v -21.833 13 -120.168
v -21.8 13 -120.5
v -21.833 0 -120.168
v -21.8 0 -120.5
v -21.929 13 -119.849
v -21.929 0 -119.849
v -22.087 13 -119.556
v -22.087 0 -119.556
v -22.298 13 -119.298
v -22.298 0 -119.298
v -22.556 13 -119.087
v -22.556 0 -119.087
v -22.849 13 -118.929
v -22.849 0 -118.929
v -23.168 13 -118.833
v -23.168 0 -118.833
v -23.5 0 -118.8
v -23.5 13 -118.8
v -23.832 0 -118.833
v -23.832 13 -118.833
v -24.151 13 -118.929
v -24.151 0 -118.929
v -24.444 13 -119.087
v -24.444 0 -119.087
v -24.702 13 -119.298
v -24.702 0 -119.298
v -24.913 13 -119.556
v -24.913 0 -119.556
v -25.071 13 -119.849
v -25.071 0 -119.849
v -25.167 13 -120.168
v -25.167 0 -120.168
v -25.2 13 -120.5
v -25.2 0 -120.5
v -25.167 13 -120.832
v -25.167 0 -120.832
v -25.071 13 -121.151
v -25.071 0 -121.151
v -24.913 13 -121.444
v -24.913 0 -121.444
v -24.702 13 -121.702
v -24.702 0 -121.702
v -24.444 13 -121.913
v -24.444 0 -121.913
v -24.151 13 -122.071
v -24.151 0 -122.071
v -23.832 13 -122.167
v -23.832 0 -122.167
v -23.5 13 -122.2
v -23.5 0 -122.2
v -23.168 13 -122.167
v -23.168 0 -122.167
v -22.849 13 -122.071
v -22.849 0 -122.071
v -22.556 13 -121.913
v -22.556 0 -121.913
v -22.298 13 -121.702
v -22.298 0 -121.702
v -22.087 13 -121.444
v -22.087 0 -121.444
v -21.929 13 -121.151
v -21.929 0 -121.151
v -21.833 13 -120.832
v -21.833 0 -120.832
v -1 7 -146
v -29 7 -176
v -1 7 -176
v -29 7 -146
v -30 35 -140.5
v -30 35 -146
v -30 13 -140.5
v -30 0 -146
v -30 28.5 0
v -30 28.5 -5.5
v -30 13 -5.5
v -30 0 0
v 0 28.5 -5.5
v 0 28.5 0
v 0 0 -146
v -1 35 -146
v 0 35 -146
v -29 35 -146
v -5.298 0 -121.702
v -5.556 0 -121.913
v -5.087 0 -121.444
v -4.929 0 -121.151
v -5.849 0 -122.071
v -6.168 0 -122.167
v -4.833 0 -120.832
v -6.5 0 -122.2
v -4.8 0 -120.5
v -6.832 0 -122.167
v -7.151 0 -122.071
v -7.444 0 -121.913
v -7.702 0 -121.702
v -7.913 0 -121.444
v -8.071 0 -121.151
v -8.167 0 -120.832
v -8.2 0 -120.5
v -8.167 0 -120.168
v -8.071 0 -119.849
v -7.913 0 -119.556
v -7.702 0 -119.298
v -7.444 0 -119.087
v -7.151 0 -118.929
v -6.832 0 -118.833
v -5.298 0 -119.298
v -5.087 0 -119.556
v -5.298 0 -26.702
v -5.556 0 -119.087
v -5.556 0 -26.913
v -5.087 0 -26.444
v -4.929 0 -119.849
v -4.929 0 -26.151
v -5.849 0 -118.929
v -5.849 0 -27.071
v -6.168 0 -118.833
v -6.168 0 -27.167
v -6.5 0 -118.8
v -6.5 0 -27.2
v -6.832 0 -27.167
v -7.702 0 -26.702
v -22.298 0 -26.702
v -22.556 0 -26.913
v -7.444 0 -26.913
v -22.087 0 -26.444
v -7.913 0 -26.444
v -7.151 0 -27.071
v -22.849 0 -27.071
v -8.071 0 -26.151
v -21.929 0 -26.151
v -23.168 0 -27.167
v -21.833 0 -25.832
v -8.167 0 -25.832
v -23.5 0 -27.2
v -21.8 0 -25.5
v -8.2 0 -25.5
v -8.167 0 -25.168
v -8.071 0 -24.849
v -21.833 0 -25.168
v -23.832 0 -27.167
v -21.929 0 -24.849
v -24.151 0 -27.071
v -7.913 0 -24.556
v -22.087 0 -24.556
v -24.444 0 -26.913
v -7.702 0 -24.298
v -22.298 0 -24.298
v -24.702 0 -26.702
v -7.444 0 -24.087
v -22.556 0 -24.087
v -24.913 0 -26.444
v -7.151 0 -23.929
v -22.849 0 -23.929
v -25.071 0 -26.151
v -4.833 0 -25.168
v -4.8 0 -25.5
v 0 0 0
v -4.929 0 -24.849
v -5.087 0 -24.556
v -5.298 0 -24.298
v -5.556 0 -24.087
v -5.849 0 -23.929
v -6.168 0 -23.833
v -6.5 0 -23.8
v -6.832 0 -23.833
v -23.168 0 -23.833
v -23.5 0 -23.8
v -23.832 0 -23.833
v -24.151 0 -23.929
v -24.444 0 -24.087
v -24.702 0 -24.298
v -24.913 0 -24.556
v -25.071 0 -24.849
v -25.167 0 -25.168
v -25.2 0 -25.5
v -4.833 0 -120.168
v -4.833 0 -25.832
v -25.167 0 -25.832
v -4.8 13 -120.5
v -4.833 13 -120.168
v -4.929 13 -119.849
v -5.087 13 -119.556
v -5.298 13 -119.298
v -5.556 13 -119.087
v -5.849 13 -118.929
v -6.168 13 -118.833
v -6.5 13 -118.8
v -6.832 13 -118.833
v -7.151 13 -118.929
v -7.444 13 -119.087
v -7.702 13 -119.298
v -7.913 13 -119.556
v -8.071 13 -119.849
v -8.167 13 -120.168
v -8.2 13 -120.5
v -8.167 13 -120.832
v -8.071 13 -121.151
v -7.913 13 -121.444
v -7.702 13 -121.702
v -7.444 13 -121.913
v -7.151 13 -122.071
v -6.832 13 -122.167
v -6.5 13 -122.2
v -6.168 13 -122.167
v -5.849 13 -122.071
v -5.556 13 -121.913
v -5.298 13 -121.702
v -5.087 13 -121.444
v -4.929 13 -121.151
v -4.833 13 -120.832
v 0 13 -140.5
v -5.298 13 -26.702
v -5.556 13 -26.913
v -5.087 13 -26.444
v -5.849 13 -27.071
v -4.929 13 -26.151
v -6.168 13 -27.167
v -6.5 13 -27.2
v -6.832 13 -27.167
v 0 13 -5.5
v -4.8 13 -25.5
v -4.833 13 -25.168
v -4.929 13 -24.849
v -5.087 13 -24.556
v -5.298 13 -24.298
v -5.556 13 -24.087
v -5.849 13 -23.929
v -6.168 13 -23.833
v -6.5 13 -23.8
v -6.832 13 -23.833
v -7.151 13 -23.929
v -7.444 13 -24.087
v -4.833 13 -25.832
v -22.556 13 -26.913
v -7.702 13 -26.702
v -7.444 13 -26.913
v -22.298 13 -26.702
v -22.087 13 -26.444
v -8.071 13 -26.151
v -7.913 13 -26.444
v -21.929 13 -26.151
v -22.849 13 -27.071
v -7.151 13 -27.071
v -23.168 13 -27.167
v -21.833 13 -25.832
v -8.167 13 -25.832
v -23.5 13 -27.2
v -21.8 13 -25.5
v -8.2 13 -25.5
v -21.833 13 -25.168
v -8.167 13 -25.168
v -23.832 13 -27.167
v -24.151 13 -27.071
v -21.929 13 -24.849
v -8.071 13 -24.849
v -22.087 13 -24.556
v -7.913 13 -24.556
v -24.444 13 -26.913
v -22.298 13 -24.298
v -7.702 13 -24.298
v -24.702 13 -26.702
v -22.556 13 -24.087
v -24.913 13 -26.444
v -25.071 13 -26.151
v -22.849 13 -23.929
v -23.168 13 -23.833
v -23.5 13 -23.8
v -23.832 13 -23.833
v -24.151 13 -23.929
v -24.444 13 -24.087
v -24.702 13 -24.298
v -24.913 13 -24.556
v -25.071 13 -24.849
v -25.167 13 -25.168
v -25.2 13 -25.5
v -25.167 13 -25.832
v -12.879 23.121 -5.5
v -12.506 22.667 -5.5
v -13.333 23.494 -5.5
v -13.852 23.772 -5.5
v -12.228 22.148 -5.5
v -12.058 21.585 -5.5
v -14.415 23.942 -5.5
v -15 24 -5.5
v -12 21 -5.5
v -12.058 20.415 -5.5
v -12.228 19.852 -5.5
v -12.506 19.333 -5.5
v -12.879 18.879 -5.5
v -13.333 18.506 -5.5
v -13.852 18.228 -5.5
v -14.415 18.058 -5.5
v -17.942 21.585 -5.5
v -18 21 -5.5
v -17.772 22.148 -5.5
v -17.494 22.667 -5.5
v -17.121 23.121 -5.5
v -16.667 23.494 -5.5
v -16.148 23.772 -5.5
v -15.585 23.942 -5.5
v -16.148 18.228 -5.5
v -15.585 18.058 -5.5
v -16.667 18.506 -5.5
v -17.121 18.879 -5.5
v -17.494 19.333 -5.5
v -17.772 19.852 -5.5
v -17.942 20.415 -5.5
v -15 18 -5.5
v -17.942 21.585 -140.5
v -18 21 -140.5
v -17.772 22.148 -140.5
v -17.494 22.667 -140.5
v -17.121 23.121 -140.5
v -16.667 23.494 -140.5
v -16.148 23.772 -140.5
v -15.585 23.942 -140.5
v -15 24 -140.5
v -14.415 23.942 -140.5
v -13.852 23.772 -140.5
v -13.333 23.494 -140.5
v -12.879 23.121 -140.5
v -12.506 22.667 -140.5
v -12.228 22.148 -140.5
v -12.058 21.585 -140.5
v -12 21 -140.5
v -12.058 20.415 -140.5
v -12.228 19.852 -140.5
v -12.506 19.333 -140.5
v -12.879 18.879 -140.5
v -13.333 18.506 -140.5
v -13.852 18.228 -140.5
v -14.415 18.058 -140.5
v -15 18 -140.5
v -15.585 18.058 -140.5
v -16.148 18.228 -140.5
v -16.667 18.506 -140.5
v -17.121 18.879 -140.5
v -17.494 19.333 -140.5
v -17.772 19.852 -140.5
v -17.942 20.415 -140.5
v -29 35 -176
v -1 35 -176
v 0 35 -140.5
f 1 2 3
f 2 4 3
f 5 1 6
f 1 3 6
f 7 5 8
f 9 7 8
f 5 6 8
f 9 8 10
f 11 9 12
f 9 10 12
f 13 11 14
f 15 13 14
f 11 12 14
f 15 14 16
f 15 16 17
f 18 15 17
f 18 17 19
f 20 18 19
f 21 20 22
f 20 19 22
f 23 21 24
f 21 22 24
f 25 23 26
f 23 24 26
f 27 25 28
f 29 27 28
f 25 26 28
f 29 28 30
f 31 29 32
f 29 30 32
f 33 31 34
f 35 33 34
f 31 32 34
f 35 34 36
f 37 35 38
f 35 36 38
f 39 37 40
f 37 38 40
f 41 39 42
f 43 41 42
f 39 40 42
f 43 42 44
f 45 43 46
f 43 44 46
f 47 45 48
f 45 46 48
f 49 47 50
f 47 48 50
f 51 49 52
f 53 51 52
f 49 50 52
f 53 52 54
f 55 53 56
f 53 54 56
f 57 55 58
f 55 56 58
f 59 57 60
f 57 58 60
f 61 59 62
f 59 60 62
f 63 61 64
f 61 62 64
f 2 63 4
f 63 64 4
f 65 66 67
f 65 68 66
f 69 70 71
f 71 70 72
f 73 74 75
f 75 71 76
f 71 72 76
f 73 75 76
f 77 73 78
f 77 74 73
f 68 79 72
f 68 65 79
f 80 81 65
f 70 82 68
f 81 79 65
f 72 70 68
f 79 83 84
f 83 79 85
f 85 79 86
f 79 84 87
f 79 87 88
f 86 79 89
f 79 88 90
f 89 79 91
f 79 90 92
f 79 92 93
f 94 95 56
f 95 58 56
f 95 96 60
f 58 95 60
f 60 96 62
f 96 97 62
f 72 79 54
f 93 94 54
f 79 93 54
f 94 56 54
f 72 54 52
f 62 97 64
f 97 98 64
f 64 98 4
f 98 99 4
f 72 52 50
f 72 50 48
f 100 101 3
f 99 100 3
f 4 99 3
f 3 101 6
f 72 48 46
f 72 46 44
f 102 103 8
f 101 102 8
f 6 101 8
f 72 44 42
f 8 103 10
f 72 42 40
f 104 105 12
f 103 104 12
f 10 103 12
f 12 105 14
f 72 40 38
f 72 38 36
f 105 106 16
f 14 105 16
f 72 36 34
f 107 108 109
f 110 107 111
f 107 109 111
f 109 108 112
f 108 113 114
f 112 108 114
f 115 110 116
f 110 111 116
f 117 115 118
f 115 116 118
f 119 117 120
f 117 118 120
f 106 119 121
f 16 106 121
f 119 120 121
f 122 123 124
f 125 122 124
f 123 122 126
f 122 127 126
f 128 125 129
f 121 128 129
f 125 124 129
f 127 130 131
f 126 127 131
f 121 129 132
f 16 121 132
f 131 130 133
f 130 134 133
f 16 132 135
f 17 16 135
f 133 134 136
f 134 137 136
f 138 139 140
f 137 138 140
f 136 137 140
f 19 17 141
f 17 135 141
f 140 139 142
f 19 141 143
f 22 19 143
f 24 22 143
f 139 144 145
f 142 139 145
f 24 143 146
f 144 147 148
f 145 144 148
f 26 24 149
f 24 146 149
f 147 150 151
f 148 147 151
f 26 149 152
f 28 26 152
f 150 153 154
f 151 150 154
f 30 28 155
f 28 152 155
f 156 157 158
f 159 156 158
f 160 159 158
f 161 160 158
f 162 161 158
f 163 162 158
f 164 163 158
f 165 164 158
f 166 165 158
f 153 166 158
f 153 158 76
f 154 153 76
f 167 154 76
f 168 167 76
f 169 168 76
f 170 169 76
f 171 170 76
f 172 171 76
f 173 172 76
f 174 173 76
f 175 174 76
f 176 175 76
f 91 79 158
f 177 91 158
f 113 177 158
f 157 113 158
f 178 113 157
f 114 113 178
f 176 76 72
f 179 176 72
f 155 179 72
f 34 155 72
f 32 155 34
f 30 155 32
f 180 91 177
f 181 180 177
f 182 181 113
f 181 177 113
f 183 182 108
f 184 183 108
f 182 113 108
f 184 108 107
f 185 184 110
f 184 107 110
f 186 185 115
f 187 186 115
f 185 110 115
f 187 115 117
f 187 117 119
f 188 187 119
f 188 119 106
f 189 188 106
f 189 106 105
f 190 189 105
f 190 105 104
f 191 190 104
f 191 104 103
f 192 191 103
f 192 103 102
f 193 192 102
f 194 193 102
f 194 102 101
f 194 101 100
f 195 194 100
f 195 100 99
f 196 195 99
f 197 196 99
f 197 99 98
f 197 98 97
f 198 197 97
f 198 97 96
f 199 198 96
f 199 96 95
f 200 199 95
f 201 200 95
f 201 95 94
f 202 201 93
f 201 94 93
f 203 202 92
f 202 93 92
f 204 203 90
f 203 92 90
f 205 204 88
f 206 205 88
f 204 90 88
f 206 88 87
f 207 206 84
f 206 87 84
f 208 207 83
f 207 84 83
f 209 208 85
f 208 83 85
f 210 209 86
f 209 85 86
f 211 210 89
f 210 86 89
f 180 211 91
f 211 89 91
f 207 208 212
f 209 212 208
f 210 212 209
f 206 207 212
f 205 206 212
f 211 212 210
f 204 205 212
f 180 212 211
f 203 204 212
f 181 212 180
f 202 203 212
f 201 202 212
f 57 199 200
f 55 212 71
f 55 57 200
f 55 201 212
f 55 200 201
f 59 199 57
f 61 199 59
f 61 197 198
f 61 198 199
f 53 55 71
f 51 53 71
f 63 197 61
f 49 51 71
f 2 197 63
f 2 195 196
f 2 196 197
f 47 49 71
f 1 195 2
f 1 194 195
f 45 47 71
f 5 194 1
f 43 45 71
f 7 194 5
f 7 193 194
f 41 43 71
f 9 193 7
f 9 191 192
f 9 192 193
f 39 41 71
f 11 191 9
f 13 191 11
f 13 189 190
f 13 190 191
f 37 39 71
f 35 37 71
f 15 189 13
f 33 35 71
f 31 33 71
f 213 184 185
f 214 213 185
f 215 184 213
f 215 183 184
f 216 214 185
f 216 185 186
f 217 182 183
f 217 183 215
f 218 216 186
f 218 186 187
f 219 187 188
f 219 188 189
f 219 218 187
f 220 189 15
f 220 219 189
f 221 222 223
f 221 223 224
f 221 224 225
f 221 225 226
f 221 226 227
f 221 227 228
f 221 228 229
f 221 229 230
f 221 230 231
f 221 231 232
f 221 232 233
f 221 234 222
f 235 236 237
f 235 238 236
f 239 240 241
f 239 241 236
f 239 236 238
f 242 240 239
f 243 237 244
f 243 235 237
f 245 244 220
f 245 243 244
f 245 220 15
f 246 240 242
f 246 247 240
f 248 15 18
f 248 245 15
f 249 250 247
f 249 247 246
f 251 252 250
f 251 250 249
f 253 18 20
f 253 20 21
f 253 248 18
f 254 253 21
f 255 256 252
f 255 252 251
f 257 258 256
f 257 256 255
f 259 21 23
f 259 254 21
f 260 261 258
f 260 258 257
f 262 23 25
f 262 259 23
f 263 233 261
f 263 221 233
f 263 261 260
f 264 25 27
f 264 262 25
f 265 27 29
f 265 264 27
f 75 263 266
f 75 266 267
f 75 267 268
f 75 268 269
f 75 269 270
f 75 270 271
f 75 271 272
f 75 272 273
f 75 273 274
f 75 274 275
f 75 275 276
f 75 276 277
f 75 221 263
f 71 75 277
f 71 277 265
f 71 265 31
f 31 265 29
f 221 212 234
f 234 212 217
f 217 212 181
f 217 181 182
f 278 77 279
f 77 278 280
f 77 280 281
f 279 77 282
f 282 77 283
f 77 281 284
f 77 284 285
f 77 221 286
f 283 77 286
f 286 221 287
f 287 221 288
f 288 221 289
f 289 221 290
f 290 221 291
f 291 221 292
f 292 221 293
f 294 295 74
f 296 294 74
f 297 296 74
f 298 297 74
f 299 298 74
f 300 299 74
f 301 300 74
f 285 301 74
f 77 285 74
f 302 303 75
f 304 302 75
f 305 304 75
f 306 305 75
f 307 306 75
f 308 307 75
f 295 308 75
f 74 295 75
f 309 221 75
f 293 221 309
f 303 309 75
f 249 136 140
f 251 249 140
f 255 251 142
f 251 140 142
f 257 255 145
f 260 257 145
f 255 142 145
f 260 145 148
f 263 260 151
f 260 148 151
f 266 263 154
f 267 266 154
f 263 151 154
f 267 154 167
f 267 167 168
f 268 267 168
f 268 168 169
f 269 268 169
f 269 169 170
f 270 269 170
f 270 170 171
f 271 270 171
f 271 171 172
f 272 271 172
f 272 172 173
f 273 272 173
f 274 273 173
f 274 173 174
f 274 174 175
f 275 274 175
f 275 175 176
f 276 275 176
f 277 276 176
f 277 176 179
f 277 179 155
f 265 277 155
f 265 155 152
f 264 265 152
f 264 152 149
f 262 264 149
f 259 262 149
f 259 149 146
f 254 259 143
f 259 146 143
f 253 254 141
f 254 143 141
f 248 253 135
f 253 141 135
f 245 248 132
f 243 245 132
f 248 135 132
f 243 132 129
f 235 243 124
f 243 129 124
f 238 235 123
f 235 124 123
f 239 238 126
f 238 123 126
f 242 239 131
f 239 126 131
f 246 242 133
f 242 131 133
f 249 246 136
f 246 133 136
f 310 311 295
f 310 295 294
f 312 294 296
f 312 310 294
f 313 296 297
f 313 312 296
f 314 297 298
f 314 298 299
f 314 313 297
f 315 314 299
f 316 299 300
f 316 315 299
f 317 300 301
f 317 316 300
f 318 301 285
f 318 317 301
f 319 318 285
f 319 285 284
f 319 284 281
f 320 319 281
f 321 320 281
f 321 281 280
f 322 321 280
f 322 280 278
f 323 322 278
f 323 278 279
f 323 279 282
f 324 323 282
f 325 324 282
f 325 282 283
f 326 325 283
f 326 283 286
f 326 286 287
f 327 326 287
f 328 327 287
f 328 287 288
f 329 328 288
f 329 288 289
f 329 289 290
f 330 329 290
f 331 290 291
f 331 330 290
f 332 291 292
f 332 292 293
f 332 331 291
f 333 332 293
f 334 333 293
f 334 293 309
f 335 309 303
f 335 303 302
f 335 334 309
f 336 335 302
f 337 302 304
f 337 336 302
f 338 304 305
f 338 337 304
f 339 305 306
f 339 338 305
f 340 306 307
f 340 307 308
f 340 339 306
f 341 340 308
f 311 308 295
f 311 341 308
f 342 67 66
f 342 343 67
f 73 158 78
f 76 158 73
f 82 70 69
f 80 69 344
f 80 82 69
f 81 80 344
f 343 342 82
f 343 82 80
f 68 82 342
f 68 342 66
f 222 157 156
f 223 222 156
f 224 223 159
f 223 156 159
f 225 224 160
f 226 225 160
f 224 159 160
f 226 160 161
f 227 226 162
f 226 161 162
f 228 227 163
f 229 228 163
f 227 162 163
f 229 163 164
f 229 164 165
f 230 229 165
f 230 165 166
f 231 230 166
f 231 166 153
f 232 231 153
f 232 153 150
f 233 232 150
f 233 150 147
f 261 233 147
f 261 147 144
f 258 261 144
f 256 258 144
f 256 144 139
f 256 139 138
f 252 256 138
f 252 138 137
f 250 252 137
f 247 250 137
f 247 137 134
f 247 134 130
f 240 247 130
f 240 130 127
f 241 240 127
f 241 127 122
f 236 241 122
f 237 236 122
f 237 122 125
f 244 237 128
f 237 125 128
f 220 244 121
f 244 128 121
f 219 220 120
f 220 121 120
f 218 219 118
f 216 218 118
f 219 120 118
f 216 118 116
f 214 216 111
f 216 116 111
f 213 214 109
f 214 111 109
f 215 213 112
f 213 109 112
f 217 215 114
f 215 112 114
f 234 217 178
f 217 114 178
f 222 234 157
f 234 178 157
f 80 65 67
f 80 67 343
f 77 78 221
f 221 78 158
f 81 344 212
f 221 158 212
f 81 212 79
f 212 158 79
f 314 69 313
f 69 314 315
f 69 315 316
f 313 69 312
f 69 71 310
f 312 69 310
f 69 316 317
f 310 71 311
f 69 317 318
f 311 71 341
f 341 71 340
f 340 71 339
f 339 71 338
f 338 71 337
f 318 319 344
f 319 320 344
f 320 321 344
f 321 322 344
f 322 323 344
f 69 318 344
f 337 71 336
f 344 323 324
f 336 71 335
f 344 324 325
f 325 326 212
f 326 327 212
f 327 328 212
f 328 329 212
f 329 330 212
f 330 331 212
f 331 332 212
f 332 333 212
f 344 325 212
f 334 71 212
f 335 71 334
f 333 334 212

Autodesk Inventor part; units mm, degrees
ref_plane "YZ Plane" through (0, 0, 0) normal (1, 0, 0) x (0, 1, 0)
ref_plane "XZ Plane" through (0, 0, 0) normal (0, 1, 0) x (-1, 0, 0)
ref_plane "XY Plane" through (0, 0, 0) normal (0, 0, 1) x (1, 0, 0)
sketch "Sketch1" plane through (0, 0, 0) normal (0, 1, 0) x (-1, 0, 0)
  line L0 (0, 0) -> (30, 0)
  line L1 (30, 0) -> (30, -146)
  line L2 (30, -146) -> (0, -146)
  line L3 (0, -146) -> (0, 0)
  dimension "d0" = 30
  dimension "d1" = 146
extrude "Extrusion1" add sketch "Sketch1" along normal blind 13
sketch "Sketch2" plane through (0, 13, 0) normal (0, 1, 0) x (1, 0, 0)
  line L0 (-30, 146) -> (-30, 0) projected
  line L1 (0, 0) -> (0, 146) projected
  line L2 (-30, 0) -> (0, 0)
  line L3 (0, 0) -> (0, 5.5)
  line L4 (0, 5.5) -> (-30, 5.5)
  line L5 (-30, 5.5) -> (-30, 0)
  line L6 (0, 146) -> (-30, 146)
  line L7 (-30, 146) -> (-30, 140.5)
  line L8 (-30, 140.5) -> (0, 140.5)
  line L9 (0, 140.5) -> (0, 146)
  line L10 (-30, 146) -> (0, 146)
  line L11 (0, 146) -> (0, 140.5)
  line L12 (0, 140.5) -> (-30, 140.5)
  line L13 (-30, 140.5) -> (-30, 146)
  dimension "d4" = 5.5
  dimension "d5" = 5.5
extrude "Extrusion2" add sketch "Sketch2" along normal blind 15.5 contours L4 L1 L2 L0
sketch "Sketch4" plane through (0, 13, 0) normal (0, 1, 0) x (1, 0, 0)
  line L0 (0, 0) -> (0, 146) projected
  line L1 (-30, 146) -> (-30, 0) projected
  line L2 (0, 146) -> (-30, 146)
  line L3 (-30, 146) -> (-30, 140.5)
  line L4 (-30, 140.5) -> (0, 140.5)
  line L5 (0, 140.5) -> (0, 146)
  point P0 (0, 140.5)
  dimension "d8" = 5.5
extrude "Extrusion3" add sketch "Sketch4" along normal blind 22
sketch "Sketch6" plane through (0, 0, -146) normal (0, 0, -1) x (-1, 0, 0)
  line L0 (30, 35) -> (0, 35) construction
  line L1 (30, 0) -> (30, 28.5) projected
  line L2 (0, 35) -> (30, 35) construction
  line L3 (30, 35) -> (30, 7) construction
  line L4 (30, 7) -> (0, 7) construction
  line L5 (0, 7) -> (0, 35) construction
  line L6 (0, 7) -> (30, 35) construction
  line L7 (0, 35) -> (30, 7) construction
  circle A0 centre (15, 21) radius 3
  point P0 (0, 0)
  dimension "d11" = 28
  dimension "d12" = 6
extrude "Extrusion4" add sketch "Sketch6" against normal up to surface (140.5 mm away)
sketch "Sketch7" plane through (0, 0, -146) normal (0, 0, -1) x (-1, 0, 0)
  line L0 (30, 0) -> (30, 28.5) projected
  line L1 (30, 35) -> (0, 35) projected
  line L2 (1, 35) -> (29, 35)
  line L3 (29, 35) -> (29, 7)
  line L4 (29, 7) -> (1, 7)
  line L5 (1, 7) -> (1, 35)
  point P0 (0, 0)
  point P1 (15, 35)
  dimension "d15" = 28
extrude "Extrusion5" add sketch "Sketch7" along normal blind 30
sketch "Sketch8" plane through (0, 0, 0) normal (0, -1, 0) x (1, 0, 0)
  circle A0 centre (-6.5, -120.5) radius 1.7
  circle A1 centre (-23.5, -120.5) radius 1.7
  circle A2 centre (-6.5, -25.5) radius 1.7
  circle A3 centre (-23.5, -25.5) radius 1.7
  line L0 (0, 0) -> (0, -146) projected
  line L1 (-30, 0) -> (0, 0) projected
  line L2 (-30, -146) -> (-30, 0) projected
  line L3 (0, -146) -> (-30, -146) projected
  dimension "d18" = 3.4
  dimension "d19" = 95
  dimension "d20" = 6.5
  dimension "d21" = 25.5
  dimension "d22" = 6.5
  dimension "d25" = 17
  dimension "d26" = 25.5
extrude "Extrusion6" cut sketch "Sketch8" against normal blind 30 contours A0 | A1 | A2 | A3
equation "\"d5\" = d4"
equation "\"d22\" = d20"
properties part number "AE_100MM_STAGE"
